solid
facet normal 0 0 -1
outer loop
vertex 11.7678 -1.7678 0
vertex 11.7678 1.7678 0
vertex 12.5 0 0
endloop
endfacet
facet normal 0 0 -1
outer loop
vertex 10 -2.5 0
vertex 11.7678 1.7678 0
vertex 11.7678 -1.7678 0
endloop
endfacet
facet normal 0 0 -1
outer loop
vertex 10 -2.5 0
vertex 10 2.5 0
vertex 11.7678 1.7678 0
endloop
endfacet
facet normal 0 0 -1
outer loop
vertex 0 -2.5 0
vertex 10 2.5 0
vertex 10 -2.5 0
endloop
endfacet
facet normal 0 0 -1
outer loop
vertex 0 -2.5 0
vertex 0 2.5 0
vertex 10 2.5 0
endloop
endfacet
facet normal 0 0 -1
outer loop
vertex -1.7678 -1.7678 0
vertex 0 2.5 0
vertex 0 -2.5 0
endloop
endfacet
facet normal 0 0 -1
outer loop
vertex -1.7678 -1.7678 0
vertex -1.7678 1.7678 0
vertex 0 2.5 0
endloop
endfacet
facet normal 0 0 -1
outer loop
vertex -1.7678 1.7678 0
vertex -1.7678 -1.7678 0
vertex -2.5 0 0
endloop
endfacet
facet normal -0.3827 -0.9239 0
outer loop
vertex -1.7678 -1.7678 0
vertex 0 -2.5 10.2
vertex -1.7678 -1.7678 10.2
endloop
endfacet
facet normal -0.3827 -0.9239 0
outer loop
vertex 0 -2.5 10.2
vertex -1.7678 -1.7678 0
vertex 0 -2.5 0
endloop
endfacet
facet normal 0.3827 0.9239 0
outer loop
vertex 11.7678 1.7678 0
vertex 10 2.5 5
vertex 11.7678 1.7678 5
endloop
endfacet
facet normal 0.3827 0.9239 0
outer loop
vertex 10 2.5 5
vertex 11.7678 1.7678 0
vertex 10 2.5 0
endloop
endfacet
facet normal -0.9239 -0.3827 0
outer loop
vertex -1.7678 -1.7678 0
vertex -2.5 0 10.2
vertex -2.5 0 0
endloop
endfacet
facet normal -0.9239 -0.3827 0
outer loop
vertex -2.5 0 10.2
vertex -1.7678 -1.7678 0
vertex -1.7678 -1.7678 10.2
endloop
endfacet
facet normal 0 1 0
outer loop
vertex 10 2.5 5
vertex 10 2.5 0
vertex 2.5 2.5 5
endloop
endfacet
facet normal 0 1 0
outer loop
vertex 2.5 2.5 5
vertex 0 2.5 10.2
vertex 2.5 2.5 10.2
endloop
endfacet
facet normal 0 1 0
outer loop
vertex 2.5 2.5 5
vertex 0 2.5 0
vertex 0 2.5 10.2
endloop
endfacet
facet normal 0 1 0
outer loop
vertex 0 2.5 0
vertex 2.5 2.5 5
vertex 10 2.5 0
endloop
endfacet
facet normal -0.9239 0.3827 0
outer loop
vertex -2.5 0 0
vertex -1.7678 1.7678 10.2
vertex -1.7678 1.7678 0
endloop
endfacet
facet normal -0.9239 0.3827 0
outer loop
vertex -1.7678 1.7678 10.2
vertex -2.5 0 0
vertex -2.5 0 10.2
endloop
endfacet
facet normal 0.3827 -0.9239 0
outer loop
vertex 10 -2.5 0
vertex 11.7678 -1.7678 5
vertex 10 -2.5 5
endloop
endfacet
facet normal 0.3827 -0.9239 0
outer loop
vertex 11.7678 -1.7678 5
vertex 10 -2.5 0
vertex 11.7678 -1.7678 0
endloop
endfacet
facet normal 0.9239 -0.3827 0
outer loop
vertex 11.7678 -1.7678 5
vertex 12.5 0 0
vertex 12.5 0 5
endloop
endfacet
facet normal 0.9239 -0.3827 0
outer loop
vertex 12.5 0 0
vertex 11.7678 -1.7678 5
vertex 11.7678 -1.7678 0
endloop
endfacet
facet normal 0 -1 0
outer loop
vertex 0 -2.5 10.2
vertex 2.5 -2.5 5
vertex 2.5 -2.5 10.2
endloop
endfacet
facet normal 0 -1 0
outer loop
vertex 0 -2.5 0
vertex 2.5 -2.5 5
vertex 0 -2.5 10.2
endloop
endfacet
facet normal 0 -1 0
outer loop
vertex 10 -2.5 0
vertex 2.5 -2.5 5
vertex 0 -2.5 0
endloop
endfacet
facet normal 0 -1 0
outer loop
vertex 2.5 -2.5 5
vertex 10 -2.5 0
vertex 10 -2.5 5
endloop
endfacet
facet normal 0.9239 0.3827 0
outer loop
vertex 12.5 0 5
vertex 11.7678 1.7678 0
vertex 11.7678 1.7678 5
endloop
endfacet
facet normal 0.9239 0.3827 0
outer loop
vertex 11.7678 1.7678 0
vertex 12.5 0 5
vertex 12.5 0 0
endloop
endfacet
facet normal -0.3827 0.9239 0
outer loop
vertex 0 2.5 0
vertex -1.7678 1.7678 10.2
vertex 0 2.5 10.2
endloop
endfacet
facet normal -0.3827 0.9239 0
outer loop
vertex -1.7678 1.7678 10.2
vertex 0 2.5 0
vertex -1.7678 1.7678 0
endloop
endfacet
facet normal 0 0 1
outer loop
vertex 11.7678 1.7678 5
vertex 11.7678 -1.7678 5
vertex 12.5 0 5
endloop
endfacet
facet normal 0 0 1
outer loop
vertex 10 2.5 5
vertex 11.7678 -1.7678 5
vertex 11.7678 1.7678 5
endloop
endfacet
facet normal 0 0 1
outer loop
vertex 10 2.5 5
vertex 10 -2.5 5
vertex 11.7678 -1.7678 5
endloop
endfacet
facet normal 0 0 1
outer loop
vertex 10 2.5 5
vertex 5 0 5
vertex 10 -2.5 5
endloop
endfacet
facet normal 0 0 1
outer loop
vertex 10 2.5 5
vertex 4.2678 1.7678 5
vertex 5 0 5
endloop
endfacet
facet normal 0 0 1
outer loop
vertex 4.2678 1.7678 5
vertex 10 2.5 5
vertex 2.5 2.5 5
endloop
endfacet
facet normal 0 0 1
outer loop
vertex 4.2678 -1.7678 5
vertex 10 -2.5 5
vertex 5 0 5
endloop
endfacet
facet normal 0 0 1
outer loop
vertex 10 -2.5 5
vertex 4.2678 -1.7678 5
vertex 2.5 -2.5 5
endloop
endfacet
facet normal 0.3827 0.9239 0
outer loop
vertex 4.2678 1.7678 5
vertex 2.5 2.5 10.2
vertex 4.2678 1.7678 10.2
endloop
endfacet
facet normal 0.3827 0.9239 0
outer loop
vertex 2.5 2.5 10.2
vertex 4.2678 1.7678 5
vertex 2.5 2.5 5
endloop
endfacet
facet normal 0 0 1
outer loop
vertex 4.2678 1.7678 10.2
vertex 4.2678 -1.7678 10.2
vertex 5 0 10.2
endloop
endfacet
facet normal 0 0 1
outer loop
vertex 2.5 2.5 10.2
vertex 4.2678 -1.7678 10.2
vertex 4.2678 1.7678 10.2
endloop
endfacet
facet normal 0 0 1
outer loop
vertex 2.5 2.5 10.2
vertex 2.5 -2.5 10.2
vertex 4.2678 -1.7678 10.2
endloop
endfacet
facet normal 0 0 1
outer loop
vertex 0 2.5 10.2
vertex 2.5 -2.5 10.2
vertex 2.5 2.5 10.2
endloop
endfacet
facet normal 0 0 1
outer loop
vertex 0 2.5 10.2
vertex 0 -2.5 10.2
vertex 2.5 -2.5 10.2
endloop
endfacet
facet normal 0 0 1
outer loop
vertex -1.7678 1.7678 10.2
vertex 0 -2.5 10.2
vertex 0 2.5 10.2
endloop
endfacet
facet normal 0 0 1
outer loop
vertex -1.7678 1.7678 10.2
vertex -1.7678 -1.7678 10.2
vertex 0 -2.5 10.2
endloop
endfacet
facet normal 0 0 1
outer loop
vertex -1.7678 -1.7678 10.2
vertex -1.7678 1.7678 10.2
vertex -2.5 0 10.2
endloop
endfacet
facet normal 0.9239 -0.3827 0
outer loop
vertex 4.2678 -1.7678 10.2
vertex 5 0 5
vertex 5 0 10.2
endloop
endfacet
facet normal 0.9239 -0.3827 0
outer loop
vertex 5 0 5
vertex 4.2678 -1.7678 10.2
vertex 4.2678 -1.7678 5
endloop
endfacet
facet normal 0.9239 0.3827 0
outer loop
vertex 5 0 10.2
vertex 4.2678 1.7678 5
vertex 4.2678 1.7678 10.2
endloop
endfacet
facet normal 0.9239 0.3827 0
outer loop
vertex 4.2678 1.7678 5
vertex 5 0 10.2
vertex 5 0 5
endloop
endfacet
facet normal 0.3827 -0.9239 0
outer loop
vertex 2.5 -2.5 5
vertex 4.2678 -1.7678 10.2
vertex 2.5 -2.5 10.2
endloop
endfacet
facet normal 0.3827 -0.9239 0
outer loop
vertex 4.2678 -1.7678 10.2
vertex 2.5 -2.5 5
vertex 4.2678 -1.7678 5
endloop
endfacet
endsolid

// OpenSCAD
// --------------------------------------------------------------
//  Author: Angel Roman
//  GitHub: https://github.com/legna-namor
//  Purpose: IKEA Skadis Peg For Attachments
// --------------------------------------------------------------
// Define parameters
height1 = 5;
height2 = 5.2;
width = 5;
length1 = 15;
length2 = 7.5;
// --------------------------------------------------------------
// Peg module
module peg(height, width, length) {
    linear_extrude(height) {
        hull() {
            translate([length - width, 0, 0]) circle(d = width);
            circle(d = width);
        }
    }
}
// --------------------------------------------------------------
// Call the peg module with three sets of parameters
peg(height1, width, length1);
translate([0, 0, height1]) peg(height2, width, length2);
// --------------------------------------------------------------
